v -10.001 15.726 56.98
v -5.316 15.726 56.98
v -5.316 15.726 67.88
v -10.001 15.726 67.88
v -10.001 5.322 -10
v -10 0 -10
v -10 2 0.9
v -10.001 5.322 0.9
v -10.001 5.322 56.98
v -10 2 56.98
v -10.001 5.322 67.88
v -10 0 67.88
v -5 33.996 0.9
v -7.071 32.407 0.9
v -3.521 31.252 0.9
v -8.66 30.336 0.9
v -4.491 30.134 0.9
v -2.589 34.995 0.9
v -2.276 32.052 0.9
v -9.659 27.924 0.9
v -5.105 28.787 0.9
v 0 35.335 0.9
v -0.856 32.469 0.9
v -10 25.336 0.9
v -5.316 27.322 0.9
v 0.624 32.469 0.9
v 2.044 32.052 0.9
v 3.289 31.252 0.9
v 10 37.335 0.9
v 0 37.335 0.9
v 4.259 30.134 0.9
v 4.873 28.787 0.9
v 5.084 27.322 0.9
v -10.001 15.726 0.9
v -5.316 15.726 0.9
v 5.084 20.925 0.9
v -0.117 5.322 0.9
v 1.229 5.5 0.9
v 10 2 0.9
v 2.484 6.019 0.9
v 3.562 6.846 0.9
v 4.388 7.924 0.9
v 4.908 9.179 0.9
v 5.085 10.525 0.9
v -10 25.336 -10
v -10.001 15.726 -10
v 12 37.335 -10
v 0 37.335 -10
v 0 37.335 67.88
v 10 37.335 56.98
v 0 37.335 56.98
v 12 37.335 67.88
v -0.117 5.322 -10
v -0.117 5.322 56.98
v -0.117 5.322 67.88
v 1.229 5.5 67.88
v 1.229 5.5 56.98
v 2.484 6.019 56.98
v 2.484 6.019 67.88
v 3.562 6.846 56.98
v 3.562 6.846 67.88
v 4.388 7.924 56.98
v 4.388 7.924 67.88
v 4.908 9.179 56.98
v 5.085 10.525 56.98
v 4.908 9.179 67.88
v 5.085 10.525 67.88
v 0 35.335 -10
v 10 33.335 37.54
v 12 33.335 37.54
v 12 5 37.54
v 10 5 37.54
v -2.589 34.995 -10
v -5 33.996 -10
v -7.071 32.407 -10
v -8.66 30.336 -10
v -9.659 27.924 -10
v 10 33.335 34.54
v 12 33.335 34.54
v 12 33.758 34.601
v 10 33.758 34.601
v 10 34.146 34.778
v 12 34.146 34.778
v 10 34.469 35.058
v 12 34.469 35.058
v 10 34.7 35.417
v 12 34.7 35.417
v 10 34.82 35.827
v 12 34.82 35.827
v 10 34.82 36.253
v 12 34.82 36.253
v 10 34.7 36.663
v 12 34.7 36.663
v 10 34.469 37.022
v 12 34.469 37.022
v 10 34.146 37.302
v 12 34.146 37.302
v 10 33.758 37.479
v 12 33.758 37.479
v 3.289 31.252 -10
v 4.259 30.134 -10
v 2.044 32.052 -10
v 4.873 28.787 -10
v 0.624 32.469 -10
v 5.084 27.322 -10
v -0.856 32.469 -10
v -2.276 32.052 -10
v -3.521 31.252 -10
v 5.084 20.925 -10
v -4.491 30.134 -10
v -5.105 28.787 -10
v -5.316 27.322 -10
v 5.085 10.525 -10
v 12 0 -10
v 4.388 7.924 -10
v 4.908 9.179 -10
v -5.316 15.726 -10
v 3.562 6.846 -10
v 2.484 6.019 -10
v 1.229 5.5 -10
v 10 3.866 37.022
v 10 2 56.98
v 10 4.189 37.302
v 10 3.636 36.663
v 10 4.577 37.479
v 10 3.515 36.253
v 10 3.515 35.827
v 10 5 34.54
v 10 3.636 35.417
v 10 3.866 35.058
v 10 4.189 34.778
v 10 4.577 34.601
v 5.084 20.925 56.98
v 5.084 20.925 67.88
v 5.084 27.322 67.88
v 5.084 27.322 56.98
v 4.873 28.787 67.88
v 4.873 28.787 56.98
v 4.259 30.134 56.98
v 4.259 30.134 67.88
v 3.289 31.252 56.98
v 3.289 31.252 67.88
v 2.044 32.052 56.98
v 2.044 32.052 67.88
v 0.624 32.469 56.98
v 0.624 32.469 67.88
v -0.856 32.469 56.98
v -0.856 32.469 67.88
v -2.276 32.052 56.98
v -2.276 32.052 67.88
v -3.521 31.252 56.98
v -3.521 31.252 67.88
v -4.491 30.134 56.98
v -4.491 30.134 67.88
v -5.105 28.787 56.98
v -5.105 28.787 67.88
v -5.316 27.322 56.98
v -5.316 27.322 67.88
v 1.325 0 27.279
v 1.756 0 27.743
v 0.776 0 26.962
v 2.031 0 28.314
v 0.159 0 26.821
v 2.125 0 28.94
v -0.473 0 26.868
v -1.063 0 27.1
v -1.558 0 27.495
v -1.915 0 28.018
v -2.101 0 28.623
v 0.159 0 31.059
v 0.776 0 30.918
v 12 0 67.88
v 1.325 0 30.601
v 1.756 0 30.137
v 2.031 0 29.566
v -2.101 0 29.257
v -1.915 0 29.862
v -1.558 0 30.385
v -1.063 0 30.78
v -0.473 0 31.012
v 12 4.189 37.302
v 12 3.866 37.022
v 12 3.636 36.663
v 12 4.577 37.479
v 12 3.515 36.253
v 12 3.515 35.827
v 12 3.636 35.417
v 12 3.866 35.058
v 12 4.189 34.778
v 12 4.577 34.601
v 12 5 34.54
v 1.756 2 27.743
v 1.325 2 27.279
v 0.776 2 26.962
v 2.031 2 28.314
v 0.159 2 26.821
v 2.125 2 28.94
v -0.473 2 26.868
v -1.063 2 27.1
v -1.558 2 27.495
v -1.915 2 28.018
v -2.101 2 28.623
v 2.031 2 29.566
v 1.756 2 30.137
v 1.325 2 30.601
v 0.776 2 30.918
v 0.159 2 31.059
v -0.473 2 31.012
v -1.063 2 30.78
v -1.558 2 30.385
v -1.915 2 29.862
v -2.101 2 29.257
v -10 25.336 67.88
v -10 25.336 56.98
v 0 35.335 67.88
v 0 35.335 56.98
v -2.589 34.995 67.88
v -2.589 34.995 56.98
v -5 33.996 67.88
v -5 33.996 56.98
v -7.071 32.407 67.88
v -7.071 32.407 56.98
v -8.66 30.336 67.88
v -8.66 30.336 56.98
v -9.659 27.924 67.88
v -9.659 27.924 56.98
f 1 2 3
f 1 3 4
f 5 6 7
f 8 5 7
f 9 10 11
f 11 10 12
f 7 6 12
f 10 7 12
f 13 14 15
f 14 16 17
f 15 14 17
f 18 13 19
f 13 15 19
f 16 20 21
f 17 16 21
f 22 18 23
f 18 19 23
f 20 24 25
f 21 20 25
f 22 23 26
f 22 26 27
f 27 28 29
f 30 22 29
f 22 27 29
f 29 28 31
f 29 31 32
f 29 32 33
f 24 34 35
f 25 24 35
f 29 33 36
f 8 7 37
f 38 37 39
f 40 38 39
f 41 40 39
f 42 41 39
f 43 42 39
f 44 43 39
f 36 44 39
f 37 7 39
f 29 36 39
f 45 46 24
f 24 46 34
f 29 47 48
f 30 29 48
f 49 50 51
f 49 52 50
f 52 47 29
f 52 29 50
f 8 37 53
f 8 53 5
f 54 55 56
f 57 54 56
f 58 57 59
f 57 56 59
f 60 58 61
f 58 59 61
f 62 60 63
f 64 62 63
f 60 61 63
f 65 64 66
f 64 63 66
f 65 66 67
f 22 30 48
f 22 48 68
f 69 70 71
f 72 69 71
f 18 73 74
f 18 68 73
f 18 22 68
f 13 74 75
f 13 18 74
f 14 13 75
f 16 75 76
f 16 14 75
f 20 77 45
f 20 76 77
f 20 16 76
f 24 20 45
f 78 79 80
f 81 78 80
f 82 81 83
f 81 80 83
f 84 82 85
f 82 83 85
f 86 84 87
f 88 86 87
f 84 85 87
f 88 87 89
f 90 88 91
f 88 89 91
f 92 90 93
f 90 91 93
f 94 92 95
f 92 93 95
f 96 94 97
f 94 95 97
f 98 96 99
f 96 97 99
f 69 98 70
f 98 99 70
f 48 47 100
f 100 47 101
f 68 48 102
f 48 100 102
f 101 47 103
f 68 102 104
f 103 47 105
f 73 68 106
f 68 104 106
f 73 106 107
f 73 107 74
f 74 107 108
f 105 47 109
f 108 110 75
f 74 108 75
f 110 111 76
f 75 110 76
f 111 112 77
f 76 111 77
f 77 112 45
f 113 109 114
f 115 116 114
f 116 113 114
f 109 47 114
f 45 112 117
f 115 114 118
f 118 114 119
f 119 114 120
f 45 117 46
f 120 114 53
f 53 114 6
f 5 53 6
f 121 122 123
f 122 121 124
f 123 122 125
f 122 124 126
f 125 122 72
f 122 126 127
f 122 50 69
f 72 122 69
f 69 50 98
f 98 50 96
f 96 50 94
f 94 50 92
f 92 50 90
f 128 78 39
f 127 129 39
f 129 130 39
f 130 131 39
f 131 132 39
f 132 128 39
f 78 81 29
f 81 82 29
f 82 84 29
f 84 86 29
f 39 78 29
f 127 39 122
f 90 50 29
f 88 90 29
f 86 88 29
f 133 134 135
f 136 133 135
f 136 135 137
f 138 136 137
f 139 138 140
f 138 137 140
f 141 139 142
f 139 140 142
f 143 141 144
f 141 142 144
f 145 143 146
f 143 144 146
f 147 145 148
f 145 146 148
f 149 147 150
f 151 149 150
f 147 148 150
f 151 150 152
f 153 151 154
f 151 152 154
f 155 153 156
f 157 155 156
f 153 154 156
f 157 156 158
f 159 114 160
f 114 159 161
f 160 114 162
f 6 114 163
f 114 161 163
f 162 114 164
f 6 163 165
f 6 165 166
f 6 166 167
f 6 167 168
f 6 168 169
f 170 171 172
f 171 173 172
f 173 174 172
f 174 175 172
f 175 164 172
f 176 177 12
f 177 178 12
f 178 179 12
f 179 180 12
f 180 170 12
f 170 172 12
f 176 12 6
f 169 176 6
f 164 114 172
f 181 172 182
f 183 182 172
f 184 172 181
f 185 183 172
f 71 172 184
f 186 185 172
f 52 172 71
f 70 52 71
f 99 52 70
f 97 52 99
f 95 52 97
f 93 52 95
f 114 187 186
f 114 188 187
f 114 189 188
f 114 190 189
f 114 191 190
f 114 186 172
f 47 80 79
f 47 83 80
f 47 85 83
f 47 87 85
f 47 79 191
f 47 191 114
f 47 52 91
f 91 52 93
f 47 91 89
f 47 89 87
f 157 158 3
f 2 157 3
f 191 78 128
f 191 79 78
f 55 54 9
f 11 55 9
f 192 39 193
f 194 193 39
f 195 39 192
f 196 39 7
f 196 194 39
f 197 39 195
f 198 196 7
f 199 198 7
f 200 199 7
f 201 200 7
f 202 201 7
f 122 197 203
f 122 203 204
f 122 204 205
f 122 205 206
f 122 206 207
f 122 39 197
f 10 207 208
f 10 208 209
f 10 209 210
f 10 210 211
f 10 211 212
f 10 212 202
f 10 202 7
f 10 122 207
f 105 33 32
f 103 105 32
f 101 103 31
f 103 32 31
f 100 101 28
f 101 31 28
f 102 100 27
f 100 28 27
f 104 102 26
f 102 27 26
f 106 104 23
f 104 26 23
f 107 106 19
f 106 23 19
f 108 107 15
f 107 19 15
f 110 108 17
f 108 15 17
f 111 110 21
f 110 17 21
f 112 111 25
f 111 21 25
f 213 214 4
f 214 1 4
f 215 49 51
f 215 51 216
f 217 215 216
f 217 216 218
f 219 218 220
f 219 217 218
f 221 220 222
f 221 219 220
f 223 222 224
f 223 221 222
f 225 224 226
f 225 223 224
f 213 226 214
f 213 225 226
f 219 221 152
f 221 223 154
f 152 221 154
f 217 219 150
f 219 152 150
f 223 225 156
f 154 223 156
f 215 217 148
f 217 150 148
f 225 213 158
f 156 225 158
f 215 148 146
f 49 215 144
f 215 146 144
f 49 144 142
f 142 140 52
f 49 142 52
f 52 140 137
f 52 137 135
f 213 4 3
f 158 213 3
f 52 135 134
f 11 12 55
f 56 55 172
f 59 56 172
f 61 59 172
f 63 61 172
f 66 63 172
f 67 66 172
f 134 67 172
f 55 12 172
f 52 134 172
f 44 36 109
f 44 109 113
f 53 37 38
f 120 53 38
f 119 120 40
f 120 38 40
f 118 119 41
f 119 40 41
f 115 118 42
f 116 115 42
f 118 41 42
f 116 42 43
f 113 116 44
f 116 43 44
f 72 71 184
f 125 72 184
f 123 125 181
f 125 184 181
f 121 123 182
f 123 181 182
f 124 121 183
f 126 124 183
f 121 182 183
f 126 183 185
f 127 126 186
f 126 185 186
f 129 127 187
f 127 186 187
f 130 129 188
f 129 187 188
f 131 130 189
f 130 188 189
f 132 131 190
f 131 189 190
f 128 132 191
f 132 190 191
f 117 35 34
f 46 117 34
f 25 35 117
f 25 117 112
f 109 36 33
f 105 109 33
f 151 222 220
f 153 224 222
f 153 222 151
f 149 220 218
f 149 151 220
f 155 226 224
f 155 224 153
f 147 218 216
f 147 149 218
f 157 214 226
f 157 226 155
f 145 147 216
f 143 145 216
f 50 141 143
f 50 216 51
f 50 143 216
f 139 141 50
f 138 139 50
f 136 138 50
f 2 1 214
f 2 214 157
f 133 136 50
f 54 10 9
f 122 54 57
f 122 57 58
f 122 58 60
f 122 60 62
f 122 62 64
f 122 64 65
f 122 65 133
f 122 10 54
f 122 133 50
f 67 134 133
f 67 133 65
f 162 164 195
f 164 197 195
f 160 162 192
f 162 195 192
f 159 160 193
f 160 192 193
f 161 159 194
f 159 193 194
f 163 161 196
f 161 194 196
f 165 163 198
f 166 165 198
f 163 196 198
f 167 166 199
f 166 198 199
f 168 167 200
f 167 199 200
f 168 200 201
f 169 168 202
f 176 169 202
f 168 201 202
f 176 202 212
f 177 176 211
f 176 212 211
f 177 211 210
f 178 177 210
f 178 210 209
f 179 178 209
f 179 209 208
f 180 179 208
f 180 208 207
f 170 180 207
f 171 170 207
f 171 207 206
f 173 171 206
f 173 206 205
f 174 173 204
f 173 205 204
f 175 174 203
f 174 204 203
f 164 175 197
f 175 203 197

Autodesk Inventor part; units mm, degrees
ref_plane "YZ Plane" through (0, 0, 0) normal (1, 0, 0) x (0, 1, 0)
ref_plane "XZ Plane" through (0, 0, 0) normal (0, 1, 0) x (-1, 0, 0)
ref_plane "XY Plane" through (0, 0, 0) normal (0, 0, 1) x (1, 0, 0)
sketch "Sketch1" plane through (0, 0, 0) normal (0, 1, 0) x (-1, 0, 0)
  line L0 (10, 67.88) -> (-10, 67.88)
  line L1 (-10, 67.88) -> (-10, -10)
  line L2 (-10, -10) -> (10, -10)
  line L3 (10, -10) -> (10, 67.88)
  point P0 (0, 0)
  dimension "d0" = 20
  dimension "d1" = 77.88
extrude "Extrusion1" add sketch "Sketch1" along normal blind 2
sketch "Sketch2" plane through (0, 2, 0) normal (0, 1, 0) x (1, 0, 0)
  line L0 (-10, -67.88) -> (10, -67.88) projected
  line L1 (0, -67.88) -> (-6.35, -67.88)
  line L2 (-6.35, -56.98) -> (6.35, -56.98)
  line L3 (6.35, -67.88) -> (0, -67.88)
  line L4 (10, 10) -> (-10, 10) projected
  line L5 (-6.35, -0.9) -> (6.35, -0.9)
  line L6 (-6.35, 10) -> (6.35, 10)
  line L7 (-6.35, -67.88) -> (-10, -67.88)
  line L8 (-10, 10) -> (-10, -67.88) projected
  line L9 (-10, -56.98) -> (-6.35, -56.98)
  line L10 (6.35, -67.88) -> (10, -67.88)
  line L11 (10, -67.88) -> (10, 10) projected
  line L12 (10, -56.98) -> (6.35, -56.98)
  line L13 (6.35, -0.9) -> (10, -0.9)
  line L14 (10, 10) -> (6.35, 10)
  line L15 (10, -0.9) -> (10, 10)
  line L16 (10, -67.88) -> (10, -56.98)
  line L17 (-10, -67.88) -> (-10, -56.98)
  line L18 (-6.35, -0.9) -> (-10, -0.9)
  line L19 (-10, -0.9) -> (-10, 10)
  line L20 (-10, 10) -> (-6.35, 10)
  point P0 (0, 0)
  dimension "d4" = 6.35
  dimension "d5" = 10.9
  dimension "d6" = 12.7
  dimension "d7" = 10.9
extrude "Extrusion2" add sketch "Sketch2" along normal blind 33.3354 contours L8 L9 L2 L12 L11 L0 | L8 L4 L11 L13 L5 L18
sketch "Sketch9" plane through (-10, 0, 67.88) normal (0, 0, 1) x (1, 0, 0)
  arc A0 (15.084, 27.3223) -> (4.684, 27.3223) centre (9.884, 27.3223) ccw
  line L0 (15.084, 20.9249) -> (15.084, 27.3223)
  line L1 (4.684, 26.1247) -> (4.684, 27.3223)
  arc A1 (15.084, 27.3223) -> (4.684, 27.3223) centre (9.884, 27.3223) ccw
  line L2 (4.684, 27.3223) -> (4.684, 20.9247)
  line L3 (9.8827, 5.3222) -> (-0.0013, 5.3222)
  line L4 (-0.0013, 15.726) -> (-0.0013, 5.3222)
  line L5 (4.684, 20.9247) -> (4.684, 15.726)
  line L6 (15.084, 20.9249) -> (15.0853, 10.5254)
  arc A2 (15.084, 20.9249) -> (15.084, 20.9251) centre (9.884, 20.9243) ccw
  line L7 (4.684, 15.726) -> (-0.0013, 15.726)
  arc A3 (9.8827, 5.3222) -> (15.0853, 10.5254) centre (9.8827, 10.5248) ccw
  line L8 (0, 35.3354) -> (20, 35.3354) projected
  line L9 (0, 0) -> (0, 35.3354) projected
  line L10 (20, 0) -> (20, 35.3354) projected
  point P0 (10, 0)
  point P1 (9.884, 32.5223)
  point P2 (10, 35.3354)
  point P3 (9.884, 32.5223)
  point P4 (4.9407, 5.3222)
  point P5 (2.3413, 15.726)
  point P6 (4.684, 24.1235)
  point P7 (15.084, 24.1236)
  dimension "d76" = 2.8131
  dimension "d77" = 27.2001
  dimension "d78" = 10.4039
  dimension "d79" = 10.4
  dimension "d80" = 4.684
  dimension "d81" = 4.916
fillet "Fillet4" radius 10 4 edges at (10, 35.3354, 62.43) (-10, 35.3354, 62.43) (-10, 35.3354, -4.55) (10, 35.3354, -4.55)
sketch "Sketch10" plane through (0, 2, 0) normal (0, 1, 0) x (1, 0, 0)
  line L0 (10, -67.88) -> (-10, -67.88) projected
  line L1 (-10, 10) -> (10, 10) projected
  line L2 (10, -56.98) -> (10, -0.9) projected
  line L3 (-10, -0.9) -> (-10, -56.98) projected
  line L4 (10, -28.94) -> (-10, -28.94)
  circle A0 centre (0, -28.94) radius 2.125
  point P0 (0, 0)
  dimension "d53" = 77.88
  dimension "d54" = 4.25
extrude "Extrusion10" cut sketch "Sketch10" against normal blind 2
extrude "Extrusion11" cut sketch "Sketch9" against normal through all
sketch "Sketch11" plane through (10, 0, 67.88) normal (1, 0, 0) x (0, 0, -1)
  line L0 (0, 0) -> (0, 5.3222) projected
  line L1 (77.88, 15.726) -> (77.88, 25.3354) projected
  line L2 (0, 0) -> (77.88, 0)
  line L3 (77.88, 0) -> (77.88, 25.3354)
  line L4 (77.88, 25.3354) -> (0, 25.3354)
  line L5 (0, 25.3354) -> (0, 0)
  point P0 (67.88, 0)
extrude "Extrusion12" add sketch "Sketch11" along normal blind 2
sketch "Sketch12" plane through (12, 0, 67.88) normal (1, 0, 0) x (0, 0, -1)
  line L0 (10.9, 25.3354) -> (0, 25.3354) projected
  line L1 (77.88, 15.726) -> (77.88, 25.3354) projected
  line L2 (0, 25.3354) -> (77.88, 25.3354)
  line L3 (77.88, 25.3354) -> (0, 25.3354) projected
  line L4 (38.94, 25.3354) -> (64.34, 25.3354)
  line L5 (38.94, 25.3354) -> (13.54, 25.3354)
  line L6 (77.88, 0) -> (0, 0) projected
  line L7 (13.54, 25.3354) -> (64.34, 25.3354)
  line L8 (64.34, 25.3354) -> (64.34, 0)
  line L9 (64.34, 0) -> (13.54, 0)
  line L10 (13.54, 0) -> (13.54, 25.3354)
  line L11 (13.54, 0) -> (31.84, 0)
  line L12 (31.84, 0) -> (31.84, 5)
  arc A0 (33.34, 21.3354) -> (30.34, 21.3354) centre (31.84, 21.3354) ccw
  arc A1 (30.34, 5) -> (33.34, 5) centre (31.84, 5) ccw
  line L13 (30.34, 21.3354) -> (30.34, 5)
  line L14 (33.34, 21.3354) -> (33.34, 5)
  line L15 (31.84, 21.3354) -> (13.54, 21.3354)
  point P0 (67.88, 0)
  dimension "d65" = 25.4
  dimension "d66" = 25.4
  dimension "d67" = 50.8
  dimension "d68" = 18.3
  dimension "d69" = 5
  dimension "d71" = 3
  dimension "d72" = 3
  dimension "d75" = 18.3
  dimension "d82" = 4
extrude "Extrusion13" cut sketch "Sketch12" against normal blind 2 contours A0 L14 A1 L13
sketch "Sketch14" plane through (-0.116, 27.3223, 67.88) normal (0, 0, 1) x (1, 0, 0)
  arc A0 (10.116, -1.9869) -> (-9.884, -1.9869) centre (0.116, -1.9869) ccw projected
  line L0 (12.116, 8.0131) -> (12.116, -1.9869)
  line L1 (12.116, 8.0131) -> (12.116, 10.0131)
  line L2 (12.116, 10.0131) -> (0.116, 10.0131)
  line L3 (0.116, 10.0131) -> (0.116, 8.0131)
  arc A1 (10.116, -1.9869) -> (-9.884, -1.9869) centre (0.116, -1.9869) ccw projected
  arc A2 (10.116, -1.9869) -> (0.116, 8.0131) centre (0.116, -1.9869) ccw
  line L4 (10.116, -1.9869) -> (12.116, -1.9869)
  line L5 (0.116, 8.0131) -> (0.116, 10.0131)
  line L6 (0.116, 10.0131) -> (12.116, 10.0131)
  line L7 (12.116, -1.9869) -> (12.116, 10.0131)
  point P0 (0.116, -27.3223)
  dimension "d83" = 2
extrude "Extrusion14" add sketch "Sketch14" against normal up to surface (77.88 mm away)
sketch "Sketch15" plane through (0, 37.3354, 67.88) normal (0, 1, 0) x (1, 0, 0)
  line L0 (0, 10.9) -> (0, 66.98) projected
  line L1 (-10, 10.9) -> (10, 10.9) projected
  line L2 (0, 66.98) -> (10, 66.98)
  line L3 (10, 66.98) -> (10, 10.9)
  line L4 (10, 10.9) -> (0, 10.9)
  line L5 (0, 10.9) -> (0, 66.98)
  point P0 (0, 67.88)
extrude "Extrusion15" cut sketch "Sketch15" against normal up to next
sketch "Sketch16" plane through (12, 0, 67.88) normal (1, 0, 0) x (0, 0, -1)
  arc A0 (33.34, 21.3354) -> (30.34, 21.3354) centre (31.84, 21.3354) ccw projected
  line L0 (66.98, 37.3354) -> (10.9, 37.3354) projected
  arc A1 (33.34, 33.3354) -> (30.34, 33.3354) centre (31.84, 33.3354) ccw
  line L1 (30.34, 33.3354) -> (30.34, 21.3354)
  line L2 (33.34, 33.3354) -> (33.34, 21.3354)
  arc A2 (30.34, 21.3354) -> (33.34, 21.3354) centre (31.84, 21.3354) ccw
  arc A3 (33.34, 33.3354) -> (30.34, 33.3354) centre (31.84, 33.3354) ccw
  point P0 (67.88, 0)
  dimension "d89" = 3
extrude "Extrusion16" cut sketch "Sketch16" against normal blind 2 contours A0 L1 A1 L2
properties part number "6 Backet Adjustment 3.0 short"
